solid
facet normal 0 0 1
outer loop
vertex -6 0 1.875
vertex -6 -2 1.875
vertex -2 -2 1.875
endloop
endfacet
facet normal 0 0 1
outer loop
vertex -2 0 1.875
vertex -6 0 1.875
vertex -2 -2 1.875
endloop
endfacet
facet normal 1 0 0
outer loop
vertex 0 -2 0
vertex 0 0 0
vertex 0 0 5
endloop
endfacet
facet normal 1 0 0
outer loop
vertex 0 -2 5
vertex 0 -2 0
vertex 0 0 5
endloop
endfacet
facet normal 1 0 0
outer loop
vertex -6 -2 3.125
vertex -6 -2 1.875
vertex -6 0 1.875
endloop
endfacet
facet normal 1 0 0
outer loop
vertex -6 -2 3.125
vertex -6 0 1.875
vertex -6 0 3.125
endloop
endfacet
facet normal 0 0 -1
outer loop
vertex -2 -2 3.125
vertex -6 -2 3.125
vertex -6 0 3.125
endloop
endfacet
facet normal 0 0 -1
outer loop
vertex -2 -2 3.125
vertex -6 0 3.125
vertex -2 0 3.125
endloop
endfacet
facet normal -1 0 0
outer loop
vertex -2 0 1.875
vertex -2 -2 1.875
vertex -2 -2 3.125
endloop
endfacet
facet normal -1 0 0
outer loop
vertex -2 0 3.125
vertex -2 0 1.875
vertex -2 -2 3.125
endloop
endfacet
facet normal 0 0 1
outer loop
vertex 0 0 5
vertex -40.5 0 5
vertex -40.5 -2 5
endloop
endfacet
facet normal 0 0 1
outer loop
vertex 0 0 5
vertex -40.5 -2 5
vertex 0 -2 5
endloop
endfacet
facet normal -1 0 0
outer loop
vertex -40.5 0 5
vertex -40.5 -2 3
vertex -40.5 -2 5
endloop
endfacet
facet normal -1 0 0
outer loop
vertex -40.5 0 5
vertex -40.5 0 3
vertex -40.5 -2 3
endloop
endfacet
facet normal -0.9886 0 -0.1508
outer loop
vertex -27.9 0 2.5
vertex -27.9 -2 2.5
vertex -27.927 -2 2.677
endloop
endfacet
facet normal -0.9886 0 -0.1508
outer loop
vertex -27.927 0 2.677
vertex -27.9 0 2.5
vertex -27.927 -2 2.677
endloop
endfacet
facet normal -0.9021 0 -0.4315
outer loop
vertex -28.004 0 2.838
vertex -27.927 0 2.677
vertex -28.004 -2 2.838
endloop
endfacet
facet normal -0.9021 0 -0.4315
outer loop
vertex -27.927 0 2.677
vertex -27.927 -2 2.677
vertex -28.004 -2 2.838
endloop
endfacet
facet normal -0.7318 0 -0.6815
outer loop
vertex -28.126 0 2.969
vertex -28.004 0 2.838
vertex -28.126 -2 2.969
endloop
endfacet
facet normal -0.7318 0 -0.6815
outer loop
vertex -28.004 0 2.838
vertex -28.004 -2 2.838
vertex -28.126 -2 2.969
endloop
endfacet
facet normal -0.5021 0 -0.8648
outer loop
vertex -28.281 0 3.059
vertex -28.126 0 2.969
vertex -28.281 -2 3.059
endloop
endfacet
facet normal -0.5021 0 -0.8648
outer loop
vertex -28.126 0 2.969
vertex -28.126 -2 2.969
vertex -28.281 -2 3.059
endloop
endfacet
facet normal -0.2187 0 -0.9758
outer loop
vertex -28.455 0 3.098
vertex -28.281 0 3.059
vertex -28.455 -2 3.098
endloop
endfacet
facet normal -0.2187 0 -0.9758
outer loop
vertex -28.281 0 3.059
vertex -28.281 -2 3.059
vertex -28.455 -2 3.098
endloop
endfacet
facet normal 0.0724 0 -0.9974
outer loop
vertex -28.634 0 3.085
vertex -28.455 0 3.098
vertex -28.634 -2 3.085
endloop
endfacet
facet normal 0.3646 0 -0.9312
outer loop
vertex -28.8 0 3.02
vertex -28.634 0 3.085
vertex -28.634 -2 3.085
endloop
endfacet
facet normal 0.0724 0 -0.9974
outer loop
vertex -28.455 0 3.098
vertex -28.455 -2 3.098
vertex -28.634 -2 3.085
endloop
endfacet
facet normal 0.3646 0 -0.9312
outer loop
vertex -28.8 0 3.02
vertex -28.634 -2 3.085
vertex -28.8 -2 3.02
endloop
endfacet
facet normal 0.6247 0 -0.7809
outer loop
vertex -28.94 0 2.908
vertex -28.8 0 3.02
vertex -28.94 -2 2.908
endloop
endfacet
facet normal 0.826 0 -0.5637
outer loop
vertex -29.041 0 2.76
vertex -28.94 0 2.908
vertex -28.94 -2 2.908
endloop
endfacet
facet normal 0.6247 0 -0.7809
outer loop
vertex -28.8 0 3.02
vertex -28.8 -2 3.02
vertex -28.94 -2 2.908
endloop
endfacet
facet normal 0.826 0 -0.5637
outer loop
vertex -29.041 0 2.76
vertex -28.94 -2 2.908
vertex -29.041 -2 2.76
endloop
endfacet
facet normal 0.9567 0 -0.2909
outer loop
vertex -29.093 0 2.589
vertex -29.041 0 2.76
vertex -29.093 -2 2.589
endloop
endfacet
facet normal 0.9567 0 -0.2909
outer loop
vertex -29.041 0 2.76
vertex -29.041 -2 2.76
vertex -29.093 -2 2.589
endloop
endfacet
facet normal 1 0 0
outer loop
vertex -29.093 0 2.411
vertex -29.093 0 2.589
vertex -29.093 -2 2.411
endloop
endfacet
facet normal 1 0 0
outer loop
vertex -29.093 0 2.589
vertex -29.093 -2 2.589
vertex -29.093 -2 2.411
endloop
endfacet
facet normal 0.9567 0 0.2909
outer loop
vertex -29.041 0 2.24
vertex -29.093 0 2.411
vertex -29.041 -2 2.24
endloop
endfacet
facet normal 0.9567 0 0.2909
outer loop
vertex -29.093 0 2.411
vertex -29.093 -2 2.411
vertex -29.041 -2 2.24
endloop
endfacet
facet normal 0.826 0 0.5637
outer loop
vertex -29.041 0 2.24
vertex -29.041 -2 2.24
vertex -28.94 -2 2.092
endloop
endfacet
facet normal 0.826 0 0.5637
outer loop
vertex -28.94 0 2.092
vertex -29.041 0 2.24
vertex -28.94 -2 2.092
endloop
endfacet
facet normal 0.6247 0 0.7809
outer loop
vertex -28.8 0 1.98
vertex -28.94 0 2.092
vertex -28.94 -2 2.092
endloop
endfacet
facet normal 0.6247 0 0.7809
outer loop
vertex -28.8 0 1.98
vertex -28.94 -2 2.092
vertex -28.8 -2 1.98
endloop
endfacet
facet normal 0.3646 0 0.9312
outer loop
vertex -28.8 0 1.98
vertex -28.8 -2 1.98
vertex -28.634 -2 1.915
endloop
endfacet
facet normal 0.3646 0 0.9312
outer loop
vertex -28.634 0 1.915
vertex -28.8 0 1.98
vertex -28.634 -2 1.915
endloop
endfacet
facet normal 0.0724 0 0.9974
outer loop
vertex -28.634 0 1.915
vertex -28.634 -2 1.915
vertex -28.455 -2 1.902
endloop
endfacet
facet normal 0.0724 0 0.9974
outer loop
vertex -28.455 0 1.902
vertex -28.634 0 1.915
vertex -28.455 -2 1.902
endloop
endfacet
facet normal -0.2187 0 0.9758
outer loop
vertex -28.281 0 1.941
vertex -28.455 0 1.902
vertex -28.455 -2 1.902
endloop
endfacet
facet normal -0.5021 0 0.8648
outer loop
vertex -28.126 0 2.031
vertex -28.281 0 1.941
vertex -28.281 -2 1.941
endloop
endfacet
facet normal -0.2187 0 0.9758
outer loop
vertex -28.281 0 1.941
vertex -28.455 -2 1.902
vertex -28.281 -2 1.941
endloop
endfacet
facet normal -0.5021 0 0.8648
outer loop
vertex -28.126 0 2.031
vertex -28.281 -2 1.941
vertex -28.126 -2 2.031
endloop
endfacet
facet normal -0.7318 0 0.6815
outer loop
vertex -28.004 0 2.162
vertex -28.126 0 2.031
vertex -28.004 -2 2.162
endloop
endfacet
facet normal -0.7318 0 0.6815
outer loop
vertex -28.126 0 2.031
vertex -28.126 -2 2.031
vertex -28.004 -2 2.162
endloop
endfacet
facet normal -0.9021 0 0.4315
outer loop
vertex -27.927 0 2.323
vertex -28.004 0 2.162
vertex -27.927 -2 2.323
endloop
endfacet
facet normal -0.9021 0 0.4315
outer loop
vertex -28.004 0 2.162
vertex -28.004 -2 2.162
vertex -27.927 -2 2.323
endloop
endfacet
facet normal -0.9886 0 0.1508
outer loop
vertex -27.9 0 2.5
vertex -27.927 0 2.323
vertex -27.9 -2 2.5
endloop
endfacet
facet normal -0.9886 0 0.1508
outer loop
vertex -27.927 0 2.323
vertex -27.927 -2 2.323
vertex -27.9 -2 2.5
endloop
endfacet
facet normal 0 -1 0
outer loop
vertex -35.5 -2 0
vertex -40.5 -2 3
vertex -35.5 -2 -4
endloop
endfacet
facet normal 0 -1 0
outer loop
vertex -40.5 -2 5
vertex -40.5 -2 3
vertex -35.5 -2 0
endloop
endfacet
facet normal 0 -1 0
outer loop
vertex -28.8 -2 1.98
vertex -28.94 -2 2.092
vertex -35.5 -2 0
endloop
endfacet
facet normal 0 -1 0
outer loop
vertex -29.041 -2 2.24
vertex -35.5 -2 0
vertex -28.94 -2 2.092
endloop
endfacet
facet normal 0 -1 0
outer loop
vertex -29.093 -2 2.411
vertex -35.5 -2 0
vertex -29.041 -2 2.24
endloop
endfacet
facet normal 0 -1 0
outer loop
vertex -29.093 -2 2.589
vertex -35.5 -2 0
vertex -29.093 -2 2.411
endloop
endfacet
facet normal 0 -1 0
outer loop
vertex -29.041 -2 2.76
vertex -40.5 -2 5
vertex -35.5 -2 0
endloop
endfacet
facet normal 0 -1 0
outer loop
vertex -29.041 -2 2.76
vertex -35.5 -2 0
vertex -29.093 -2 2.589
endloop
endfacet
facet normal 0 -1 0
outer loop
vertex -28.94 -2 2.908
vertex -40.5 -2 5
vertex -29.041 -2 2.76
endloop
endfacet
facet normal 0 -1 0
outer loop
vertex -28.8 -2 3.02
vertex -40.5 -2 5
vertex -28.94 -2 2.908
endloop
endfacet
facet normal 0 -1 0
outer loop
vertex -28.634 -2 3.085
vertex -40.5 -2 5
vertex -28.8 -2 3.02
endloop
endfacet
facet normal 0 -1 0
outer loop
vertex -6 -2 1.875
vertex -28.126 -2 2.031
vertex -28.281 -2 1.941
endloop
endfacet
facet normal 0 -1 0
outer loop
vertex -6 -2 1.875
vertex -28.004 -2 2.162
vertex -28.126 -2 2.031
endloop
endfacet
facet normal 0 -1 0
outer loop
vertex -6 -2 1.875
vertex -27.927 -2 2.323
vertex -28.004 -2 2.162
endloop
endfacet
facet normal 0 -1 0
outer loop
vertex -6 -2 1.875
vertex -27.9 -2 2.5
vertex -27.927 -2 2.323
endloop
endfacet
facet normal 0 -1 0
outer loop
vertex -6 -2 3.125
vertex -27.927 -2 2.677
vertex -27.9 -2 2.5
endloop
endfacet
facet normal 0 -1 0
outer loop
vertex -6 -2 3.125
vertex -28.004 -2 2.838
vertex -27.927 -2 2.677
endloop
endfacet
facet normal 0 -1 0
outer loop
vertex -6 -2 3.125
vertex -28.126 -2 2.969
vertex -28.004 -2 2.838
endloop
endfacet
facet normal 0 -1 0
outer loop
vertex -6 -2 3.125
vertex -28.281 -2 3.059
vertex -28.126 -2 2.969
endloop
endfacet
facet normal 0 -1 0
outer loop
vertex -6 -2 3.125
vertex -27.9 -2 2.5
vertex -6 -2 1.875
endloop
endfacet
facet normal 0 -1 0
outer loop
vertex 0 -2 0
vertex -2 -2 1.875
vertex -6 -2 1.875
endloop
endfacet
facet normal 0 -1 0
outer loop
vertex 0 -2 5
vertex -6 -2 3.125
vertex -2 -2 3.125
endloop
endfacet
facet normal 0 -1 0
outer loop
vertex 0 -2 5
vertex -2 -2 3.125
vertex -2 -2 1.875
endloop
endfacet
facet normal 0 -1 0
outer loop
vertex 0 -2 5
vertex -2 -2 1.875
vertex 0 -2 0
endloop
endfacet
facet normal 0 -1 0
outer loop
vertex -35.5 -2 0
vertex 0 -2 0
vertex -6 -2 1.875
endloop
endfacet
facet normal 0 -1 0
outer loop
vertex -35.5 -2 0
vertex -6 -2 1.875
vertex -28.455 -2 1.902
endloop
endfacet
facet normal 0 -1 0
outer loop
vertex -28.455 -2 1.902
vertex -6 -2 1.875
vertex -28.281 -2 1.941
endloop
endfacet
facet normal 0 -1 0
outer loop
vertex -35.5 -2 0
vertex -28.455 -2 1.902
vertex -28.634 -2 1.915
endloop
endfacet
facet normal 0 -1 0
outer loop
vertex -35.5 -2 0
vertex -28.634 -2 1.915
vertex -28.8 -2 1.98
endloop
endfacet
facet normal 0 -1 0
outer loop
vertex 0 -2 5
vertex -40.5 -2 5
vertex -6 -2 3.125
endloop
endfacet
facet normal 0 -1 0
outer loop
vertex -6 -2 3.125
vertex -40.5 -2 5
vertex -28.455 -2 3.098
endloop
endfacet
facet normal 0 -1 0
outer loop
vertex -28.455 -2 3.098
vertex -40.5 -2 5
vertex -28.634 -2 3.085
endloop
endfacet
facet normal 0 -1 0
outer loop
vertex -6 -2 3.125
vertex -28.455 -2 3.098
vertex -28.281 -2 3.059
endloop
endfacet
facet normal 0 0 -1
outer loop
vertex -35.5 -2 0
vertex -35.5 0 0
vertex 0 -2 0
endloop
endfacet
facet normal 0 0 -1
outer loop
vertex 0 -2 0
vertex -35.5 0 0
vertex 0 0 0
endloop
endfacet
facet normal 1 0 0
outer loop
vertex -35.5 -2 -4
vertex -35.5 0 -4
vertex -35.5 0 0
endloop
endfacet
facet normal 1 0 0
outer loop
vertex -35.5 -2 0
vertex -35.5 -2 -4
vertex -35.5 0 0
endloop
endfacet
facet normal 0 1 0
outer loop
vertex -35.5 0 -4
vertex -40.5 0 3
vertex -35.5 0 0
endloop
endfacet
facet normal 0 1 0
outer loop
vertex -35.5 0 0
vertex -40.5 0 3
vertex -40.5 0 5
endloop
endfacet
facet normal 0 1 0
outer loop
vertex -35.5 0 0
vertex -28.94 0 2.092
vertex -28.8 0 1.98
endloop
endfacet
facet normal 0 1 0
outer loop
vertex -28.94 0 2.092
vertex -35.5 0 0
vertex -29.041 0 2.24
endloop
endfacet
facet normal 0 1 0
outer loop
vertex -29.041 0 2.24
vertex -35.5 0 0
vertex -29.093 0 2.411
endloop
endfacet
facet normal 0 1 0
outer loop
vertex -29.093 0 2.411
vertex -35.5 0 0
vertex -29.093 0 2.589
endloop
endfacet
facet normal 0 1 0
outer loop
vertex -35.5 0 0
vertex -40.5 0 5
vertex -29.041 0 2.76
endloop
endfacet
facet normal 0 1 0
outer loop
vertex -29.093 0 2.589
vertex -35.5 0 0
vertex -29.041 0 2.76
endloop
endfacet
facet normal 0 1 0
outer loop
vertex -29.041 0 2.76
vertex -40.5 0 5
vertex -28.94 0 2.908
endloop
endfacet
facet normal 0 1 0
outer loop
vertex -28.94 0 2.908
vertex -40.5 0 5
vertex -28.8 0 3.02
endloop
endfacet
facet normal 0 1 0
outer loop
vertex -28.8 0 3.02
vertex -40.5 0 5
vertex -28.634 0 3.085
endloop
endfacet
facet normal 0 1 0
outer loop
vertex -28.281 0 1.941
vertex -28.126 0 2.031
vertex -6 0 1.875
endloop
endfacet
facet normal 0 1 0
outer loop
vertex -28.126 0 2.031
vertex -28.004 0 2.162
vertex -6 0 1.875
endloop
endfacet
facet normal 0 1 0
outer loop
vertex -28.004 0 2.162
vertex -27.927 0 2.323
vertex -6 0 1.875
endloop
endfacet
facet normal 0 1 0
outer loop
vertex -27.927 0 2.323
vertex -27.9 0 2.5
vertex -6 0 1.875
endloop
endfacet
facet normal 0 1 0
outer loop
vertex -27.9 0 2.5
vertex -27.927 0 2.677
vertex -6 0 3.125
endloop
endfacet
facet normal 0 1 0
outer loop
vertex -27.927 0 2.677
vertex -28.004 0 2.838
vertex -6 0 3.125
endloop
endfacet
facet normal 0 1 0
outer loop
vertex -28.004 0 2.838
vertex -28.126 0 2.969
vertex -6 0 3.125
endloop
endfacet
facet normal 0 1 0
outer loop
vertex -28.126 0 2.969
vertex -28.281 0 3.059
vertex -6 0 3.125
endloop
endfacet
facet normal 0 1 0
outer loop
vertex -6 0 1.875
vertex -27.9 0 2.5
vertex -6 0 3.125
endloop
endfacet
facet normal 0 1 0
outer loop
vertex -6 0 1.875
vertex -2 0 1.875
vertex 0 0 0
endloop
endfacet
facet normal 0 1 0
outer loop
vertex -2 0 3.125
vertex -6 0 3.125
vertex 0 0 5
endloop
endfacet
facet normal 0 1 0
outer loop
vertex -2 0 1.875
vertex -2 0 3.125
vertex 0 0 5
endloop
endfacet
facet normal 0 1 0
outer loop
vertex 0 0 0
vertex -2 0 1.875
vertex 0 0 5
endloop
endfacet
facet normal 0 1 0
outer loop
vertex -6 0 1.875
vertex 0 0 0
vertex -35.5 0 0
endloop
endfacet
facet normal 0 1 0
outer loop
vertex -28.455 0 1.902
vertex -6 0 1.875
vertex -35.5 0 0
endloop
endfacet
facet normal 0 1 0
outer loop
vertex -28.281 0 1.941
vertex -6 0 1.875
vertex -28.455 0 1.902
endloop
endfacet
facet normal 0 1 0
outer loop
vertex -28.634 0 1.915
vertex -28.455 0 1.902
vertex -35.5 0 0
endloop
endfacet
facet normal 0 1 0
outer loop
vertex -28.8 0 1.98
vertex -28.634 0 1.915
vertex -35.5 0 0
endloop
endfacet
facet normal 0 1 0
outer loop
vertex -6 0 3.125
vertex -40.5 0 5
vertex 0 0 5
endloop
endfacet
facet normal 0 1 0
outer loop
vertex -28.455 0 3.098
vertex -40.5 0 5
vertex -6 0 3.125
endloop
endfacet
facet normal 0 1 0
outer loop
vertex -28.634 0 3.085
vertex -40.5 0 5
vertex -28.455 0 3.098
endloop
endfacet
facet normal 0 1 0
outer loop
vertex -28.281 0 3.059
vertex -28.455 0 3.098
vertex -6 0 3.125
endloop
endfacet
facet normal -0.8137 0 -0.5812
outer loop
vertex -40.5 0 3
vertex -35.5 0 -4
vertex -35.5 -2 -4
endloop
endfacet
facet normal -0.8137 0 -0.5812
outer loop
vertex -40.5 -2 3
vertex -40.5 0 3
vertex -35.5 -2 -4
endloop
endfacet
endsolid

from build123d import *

# Parameters (mm, degrees)
F0_W     = 40.5
F0_H     = 5
F1_DEPTH = 2
F2_W     = 5
F2_H     = 4
F3_DEPTH = 2
F4_SIZE2 = 6.99999
F4_SIZE  = 4.99999
F5_W     = 4
F5_H     = 1.25
F6_DEPTH = 2
F7_R     = 0.6
F8_DEPTH = 2


# Not quite as in the source:
# - a fillet or chamfer is up to 0.001 mm smaller than in the source, because OpenCascade refuses the exact size


with BuildPart() as f1:
    # F0 (on Front) → F1 (new body)
    with BuildSketch(Plane.XZ):
        with Locations((-20.25, 2.5)):
            Rectangle(F0_W, F0_H)
    extrude(amount=F1_DEPTH)

    # F2 (on Front) → F3 (join)
    with BuildSketch(Plane.XZ):
        with Locations((-38, -2)):
            Rectangle(F2_W, F2_H)
    extrude(amount=F3_DEPTH)

    # F4 (size 5 and 7 in the source; OpenCascade refuses exactly that, so slightly less here)
    f4_edges = [f1.edges().sort_by_distance(p)[0] for p in [
        (-40.5, -1, -4),
    ]]
    f4_side = f1.faces().sort_by_distance((-38, -1, -4))[0]
    chamfer(f4_edges, length=F4_SIZE, length2=F4_SIZE2, reference=f4_side)

    # F5 (on face) → F6 (cut)
    with BuildSketch(Plane.XZ.offset(2)):
        with Locations((-4, 2.5)):
            Rectangle(F5_W, F5_H)
    extrude(amount=-F6_DEPTH, mode=Mode.SUBTRACT)

    # F7 (on face) → F8 (cut)
    with BuildSketch(Plane.XZ.offset(2)):
        with Locations((-28.5, 2.5)):
            Circle(F7_R)
    extrude(amount=-F8_DEPTH, mode=Mode.SUBTRACT)


solid = f1.part
